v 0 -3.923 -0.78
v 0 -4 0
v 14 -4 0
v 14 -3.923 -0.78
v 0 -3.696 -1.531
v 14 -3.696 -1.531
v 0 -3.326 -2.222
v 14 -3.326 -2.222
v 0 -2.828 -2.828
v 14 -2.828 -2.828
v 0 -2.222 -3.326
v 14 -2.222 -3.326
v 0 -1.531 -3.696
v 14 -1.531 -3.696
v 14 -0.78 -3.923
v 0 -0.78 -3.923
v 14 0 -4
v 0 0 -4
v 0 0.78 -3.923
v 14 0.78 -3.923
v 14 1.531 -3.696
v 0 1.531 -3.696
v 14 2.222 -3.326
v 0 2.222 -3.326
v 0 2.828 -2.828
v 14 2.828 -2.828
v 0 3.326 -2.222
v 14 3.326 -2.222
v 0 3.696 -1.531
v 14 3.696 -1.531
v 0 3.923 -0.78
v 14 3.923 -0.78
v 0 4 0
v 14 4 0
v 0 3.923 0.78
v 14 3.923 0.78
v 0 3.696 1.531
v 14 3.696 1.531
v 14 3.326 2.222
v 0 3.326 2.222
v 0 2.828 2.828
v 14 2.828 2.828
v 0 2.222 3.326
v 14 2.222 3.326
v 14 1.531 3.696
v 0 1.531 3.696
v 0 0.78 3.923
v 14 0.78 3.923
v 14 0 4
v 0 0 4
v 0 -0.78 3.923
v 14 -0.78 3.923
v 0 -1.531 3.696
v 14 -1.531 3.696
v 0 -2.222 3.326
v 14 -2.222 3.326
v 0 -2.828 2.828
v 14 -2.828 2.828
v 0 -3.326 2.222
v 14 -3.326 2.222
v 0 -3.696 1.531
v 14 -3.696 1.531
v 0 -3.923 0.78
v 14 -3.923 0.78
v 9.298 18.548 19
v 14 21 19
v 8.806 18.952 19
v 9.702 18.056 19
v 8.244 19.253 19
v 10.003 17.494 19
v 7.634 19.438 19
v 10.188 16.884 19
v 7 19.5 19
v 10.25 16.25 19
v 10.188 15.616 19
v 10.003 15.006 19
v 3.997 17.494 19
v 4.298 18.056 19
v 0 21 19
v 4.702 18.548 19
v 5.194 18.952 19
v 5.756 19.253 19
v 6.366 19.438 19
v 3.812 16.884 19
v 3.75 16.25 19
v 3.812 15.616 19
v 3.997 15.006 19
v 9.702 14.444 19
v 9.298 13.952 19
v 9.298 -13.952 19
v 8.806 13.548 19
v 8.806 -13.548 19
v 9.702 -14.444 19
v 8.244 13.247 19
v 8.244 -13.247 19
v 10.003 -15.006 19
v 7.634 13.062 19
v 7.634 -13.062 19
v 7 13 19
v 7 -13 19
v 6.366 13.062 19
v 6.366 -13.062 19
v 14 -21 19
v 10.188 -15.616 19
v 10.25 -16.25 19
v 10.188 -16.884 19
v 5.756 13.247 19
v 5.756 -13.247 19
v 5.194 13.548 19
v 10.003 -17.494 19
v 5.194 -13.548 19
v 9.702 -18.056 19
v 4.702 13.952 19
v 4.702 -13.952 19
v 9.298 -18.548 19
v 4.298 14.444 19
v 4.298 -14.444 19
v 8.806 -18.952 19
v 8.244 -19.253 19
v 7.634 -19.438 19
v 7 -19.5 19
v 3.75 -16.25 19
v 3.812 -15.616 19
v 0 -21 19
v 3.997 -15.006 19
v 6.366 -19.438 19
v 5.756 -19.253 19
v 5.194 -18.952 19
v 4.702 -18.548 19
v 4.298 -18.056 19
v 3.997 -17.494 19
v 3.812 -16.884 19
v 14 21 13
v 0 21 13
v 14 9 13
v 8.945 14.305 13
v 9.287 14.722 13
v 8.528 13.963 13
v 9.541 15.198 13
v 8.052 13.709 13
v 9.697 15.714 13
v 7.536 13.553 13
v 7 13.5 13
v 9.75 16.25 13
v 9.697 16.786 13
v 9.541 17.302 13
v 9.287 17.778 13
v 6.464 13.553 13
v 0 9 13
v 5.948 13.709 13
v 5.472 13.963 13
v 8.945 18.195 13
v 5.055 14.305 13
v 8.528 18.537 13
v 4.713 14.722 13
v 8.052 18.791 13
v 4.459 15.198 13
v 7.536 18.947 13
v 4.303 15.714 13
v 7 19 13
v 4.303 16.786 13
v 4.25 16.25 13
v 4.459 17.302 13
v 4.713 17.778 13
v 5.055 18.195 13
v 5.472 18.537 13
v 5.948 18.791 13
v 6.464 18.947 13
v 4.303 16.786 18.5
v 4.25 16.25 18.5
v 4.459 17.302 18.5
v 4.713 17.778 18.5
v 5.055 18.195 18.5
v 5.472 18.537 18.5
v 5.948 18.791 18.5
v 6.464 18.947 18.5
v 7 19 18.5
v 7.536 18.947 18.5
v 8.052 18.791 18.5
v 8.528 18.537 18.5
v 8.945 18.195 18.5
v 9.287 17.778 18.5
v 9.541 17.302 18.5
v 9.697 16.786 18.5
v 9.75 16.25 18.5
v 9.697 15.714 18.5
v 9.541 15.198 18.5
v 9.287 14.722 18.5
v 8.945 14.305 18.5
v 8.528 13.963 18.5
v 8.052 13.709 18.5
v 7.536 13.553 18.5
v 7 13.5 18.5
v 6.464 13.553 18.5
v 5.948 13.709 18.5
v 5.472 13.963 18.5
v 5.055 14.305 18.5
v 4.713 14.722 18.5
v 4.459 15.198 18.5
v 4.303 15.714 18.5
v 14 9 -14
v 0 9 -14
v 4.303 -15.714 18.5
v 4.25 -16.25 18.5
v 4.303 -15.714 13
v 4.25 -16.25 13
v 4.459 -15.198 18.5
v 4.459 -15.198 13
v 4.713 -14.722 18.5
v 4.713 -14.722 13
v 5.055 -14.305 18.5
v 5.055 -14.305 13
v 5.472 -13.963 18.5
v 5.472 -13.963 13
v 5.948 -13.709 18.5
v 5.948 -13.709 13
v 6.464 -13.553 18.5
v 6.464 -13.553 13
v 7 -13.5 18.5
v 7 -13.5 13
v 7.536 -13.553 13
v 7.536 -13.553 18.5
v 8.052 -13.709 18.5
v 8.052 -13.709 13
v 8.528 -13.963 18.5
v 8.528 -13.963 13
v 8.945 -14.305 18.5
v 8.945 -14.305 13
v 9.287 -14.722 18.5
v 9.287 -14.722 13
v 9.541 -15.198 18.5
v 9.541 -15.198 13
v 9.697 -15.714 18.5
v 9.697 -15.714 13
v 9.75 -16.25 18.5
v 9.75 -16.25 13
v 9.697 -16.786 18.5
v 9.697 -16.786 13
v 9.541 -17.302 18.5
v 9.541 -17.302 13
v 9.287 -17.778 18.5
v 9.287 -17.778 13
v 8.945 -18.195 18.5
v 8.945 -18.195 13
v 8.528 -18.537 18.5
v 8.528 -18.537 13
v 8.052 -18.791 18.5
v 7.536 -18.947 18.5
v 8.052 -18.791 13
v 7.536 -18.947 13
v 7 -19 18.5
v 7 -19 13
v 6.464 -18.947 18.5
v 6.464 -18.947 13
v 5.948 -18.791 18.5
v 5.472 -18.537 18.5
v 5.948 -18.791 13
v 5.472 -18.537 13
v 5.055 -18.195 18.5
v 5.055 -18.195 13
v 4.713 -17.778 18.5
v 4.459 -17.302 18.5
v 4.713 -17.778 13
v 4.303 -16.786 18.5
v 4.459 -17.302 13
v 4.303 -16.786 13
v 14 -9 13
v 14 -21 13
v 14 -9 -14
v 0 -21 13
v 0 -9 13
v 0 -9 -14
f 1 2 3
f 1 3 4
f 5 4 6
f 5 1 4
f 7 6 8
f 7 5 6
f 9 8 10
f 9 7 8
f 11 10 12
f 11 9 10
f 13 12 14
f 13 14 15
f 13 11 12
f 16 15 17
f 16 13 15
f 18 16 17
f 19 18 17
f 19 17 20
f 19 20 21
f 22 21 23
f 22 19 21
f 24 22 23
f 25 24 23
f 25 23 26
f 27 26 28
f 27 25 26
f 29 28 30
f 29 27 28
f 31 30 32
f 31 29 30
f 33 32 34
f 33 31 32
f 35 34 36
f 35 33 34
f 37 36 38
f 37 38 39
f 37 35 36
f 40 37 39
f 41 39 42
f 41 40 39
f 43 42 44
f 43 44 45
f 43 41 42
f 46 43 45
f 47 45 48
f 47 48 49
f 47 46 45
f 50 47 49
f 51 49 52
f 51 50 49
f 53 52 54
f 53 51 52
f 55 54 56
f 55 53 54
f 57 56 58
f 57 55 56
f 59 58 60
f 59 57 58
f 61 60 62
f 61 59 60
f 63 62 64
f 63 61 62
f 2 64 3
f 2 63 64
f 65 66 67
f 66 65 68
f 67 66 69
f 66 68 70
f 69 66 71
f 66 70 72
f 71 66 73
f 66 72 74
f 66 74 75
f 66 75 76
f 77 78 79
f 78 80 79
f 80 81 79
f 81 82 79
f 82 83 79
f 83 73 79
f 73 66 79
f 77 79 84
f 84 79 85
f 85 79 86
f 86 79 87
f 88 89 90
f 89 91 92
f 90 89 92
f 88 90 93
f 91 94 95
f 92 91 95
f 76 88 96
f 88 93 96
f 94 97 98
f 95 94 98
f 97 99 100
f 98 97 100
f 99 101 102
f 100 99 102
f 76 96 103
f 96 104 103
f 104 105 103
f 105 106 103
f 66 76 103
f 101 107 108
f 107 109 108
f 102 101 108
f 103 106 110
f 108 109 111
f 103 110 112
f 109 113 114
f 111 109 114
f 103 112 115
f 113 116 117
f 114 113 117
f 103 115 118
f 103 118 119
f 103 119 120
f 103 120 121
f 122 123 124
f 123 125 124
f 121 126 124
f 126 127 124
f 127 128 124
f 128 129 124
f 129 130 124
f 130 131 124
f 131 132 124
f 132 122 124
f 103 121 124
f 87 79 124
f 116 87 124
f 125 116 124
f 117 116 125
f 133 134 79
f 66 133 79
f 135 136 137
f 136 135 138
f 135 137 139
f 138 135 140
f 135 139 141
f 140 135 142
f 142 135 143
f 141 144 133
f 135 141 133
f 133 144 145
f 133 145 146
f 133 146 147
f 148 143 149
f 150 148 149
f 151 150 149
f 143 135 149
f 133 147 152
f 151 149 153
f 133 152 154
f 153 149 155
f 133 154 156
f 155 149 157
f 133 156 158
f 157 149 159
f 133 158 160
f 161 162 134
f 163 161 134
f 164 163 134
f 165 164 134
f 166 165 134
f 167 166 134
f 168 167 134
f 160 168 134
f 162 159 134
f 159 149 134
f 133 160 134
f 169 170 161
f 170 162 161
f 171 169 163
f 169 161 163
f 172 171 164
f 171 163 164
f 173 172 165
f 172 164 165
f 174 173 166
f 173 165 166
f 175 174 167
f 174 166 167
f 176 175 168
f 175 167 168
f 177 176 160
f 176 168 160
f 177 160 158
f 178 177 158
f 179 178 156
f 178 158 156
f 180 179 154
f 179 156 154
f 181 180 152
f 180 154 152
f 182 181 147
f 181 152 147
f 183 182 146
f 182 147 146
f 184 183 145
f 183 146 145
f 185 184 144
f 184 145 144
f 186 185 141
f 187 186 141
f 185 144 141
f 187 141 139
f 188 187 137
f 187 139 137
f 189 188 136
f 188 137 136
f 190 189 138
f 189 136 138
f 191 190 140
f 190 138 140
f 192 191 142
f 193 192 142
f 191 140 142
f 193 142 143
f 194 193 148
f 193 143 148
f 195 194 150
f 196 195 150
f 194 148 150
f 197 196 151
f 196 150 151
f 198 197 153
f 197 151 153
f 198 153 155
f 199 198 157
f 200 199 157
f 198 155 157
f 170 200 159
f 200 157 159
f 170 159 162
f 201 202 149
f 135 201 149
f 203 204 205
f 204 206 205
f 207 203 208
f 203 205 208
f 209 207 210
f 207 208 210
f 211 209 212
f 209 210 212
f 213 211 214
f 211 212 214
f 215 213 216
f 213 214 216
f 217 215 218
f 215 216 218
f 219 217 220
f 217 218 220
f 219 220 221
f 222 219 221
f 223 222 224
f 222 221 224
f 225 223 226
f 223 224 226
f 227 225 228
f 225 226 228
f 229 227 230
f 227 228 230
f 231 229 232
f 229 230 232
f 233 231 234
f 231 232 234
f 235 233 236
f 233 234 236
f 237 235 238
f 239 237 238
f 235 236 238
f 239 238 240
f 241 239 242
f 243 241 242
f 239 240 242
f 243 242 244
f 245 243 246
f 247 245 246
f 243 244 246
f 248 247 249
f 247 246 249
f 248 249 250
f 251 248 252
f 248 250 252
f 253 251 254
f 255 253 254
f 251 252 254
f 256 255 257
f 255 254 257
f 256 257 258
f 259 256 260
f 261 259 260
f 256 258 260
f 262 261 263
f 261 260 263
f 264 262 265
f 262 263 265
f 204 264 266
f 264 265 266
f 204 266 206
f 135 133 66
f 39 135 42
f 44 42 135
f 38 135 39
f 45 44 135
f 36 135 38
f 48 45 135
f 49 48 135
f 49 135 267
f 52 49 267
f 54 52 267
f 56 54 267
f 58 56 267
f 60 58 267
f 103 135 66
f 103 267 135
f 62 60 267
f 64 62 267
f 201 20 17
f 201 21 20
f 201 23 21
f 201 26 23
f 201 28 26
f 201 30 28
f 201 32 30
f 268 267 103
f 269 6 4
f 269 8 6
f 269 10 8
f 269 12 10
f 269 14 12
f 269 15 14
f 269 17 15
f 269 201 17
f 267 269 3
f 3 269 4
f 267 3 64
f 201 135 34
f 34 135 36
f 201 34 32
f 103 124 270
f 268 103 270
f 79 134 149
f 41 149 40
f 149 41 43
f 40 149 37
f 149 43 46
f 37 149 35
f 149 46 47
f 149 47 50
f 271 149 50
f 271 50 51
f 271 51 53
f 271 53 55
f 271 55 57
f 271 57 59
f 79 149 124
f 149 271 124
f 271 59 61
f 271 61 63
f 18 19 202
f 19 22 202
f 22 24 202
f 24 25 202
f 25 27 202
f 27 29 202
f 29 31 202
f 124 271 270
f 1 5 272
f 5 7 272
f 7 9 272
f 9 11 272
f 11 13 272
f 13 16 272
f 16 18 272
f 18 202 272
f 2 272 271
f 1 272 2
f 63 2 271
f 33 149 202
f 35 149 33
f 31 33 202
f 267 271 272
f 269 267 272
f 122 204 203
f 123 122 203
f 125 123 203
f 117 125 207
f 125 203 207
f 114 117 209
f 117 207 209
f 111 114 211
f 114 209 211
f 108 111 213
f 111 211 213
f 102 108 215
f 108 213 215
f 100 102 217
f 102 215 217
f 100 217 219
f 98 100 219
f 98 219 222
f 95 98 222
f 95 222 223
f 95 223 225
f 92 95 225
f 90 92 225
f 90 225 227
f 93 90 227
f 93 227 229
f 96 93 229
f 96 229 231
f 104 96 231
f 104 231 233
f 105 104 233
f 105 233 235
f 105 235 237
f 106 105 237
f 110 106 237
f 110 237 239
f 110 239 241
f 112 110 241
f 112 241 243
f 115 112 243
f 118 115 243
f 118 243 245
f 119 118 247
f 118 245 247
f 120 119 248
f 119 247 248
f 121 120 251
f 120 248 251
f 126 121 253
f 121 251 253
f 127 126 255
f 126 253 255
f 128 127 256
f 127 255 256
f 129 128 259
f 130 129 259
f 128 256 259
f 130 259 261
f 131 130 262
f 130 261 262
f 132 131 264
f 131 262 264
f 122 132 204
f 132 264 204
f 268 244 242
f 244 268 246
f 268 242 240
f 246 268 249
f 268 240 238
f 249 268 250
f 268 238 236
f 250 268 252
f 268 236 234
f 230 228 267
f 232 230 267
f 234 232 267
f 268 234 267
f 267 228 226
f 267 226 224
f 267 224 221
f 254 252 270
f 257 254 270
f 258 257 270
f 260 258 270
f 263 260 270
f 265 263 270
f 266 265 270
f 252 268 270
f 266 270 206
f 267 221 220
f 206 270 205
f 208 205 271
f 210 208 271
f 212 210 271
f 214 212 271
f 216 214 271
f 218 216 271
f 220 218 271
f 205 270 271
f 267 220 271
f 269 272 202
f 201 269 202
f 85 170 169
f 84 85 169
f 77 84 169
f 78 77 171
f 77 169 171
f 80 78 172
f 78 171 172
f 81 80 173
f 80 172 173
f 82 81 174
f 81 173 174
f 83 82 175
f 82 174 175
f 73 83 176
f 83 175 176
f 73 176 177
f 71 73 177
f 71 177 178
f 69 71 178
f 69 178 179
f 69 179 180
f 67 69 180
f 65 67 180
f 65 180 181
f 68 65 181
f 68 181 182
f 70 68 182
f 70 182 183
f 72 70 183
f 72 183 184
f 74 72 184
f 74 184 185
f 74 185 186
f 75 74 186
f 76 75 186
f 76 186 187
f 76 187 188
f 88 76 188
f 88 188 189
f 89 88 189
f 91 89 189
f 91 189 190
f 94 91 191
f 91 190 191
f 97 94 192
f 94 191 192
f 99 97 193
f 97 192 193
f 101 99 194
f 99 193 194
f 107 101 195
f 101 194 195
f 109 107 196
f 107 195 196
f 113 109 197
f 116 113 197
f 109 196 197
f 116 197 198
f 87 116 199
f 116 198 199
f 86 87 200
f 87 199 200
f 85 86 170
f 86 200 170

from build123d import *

# Parameters (mm, degrees)
F0_R           = 4
F1_DEPTH       = 14
F2_ANGLE       = 180
F4_D           = 5.5
F4_CSINK_D     = 6.5
F4_CSINK_ANGLE = 90


with BuildPart() as f1:
    # F0 (on Right) → F1 (new body)
    with BuildSketch(Plane.YZ):
        Polygon((-21, -19), (0, -19), (21, -19), (21, -13), (9, -13), (9, 14), (0, 14), (-9, 14), (-9, -13), (-21, -13), align=None)
        Circle(F0_R, mode=Mode.SUBTRACT)
    extrude(amount=F1_DEPTH)


with BuildPart() as f1_1:
    # F2: moved
    add(f1.part.rotate(Axis((0, 0, 0), (-1, 0, 0)), F2_ANGLE))

    # F4 (through all)
    with Locations(Plane.XY.offset(19)):
        with Locations((7, -16.25), (7, 16.25)):
            CounterSinkHole(F4_D / 2, F4_CSINK_D / 2, counter_sink_angle=F4_CSINK_ANGLE)


solid = f1_1.part
